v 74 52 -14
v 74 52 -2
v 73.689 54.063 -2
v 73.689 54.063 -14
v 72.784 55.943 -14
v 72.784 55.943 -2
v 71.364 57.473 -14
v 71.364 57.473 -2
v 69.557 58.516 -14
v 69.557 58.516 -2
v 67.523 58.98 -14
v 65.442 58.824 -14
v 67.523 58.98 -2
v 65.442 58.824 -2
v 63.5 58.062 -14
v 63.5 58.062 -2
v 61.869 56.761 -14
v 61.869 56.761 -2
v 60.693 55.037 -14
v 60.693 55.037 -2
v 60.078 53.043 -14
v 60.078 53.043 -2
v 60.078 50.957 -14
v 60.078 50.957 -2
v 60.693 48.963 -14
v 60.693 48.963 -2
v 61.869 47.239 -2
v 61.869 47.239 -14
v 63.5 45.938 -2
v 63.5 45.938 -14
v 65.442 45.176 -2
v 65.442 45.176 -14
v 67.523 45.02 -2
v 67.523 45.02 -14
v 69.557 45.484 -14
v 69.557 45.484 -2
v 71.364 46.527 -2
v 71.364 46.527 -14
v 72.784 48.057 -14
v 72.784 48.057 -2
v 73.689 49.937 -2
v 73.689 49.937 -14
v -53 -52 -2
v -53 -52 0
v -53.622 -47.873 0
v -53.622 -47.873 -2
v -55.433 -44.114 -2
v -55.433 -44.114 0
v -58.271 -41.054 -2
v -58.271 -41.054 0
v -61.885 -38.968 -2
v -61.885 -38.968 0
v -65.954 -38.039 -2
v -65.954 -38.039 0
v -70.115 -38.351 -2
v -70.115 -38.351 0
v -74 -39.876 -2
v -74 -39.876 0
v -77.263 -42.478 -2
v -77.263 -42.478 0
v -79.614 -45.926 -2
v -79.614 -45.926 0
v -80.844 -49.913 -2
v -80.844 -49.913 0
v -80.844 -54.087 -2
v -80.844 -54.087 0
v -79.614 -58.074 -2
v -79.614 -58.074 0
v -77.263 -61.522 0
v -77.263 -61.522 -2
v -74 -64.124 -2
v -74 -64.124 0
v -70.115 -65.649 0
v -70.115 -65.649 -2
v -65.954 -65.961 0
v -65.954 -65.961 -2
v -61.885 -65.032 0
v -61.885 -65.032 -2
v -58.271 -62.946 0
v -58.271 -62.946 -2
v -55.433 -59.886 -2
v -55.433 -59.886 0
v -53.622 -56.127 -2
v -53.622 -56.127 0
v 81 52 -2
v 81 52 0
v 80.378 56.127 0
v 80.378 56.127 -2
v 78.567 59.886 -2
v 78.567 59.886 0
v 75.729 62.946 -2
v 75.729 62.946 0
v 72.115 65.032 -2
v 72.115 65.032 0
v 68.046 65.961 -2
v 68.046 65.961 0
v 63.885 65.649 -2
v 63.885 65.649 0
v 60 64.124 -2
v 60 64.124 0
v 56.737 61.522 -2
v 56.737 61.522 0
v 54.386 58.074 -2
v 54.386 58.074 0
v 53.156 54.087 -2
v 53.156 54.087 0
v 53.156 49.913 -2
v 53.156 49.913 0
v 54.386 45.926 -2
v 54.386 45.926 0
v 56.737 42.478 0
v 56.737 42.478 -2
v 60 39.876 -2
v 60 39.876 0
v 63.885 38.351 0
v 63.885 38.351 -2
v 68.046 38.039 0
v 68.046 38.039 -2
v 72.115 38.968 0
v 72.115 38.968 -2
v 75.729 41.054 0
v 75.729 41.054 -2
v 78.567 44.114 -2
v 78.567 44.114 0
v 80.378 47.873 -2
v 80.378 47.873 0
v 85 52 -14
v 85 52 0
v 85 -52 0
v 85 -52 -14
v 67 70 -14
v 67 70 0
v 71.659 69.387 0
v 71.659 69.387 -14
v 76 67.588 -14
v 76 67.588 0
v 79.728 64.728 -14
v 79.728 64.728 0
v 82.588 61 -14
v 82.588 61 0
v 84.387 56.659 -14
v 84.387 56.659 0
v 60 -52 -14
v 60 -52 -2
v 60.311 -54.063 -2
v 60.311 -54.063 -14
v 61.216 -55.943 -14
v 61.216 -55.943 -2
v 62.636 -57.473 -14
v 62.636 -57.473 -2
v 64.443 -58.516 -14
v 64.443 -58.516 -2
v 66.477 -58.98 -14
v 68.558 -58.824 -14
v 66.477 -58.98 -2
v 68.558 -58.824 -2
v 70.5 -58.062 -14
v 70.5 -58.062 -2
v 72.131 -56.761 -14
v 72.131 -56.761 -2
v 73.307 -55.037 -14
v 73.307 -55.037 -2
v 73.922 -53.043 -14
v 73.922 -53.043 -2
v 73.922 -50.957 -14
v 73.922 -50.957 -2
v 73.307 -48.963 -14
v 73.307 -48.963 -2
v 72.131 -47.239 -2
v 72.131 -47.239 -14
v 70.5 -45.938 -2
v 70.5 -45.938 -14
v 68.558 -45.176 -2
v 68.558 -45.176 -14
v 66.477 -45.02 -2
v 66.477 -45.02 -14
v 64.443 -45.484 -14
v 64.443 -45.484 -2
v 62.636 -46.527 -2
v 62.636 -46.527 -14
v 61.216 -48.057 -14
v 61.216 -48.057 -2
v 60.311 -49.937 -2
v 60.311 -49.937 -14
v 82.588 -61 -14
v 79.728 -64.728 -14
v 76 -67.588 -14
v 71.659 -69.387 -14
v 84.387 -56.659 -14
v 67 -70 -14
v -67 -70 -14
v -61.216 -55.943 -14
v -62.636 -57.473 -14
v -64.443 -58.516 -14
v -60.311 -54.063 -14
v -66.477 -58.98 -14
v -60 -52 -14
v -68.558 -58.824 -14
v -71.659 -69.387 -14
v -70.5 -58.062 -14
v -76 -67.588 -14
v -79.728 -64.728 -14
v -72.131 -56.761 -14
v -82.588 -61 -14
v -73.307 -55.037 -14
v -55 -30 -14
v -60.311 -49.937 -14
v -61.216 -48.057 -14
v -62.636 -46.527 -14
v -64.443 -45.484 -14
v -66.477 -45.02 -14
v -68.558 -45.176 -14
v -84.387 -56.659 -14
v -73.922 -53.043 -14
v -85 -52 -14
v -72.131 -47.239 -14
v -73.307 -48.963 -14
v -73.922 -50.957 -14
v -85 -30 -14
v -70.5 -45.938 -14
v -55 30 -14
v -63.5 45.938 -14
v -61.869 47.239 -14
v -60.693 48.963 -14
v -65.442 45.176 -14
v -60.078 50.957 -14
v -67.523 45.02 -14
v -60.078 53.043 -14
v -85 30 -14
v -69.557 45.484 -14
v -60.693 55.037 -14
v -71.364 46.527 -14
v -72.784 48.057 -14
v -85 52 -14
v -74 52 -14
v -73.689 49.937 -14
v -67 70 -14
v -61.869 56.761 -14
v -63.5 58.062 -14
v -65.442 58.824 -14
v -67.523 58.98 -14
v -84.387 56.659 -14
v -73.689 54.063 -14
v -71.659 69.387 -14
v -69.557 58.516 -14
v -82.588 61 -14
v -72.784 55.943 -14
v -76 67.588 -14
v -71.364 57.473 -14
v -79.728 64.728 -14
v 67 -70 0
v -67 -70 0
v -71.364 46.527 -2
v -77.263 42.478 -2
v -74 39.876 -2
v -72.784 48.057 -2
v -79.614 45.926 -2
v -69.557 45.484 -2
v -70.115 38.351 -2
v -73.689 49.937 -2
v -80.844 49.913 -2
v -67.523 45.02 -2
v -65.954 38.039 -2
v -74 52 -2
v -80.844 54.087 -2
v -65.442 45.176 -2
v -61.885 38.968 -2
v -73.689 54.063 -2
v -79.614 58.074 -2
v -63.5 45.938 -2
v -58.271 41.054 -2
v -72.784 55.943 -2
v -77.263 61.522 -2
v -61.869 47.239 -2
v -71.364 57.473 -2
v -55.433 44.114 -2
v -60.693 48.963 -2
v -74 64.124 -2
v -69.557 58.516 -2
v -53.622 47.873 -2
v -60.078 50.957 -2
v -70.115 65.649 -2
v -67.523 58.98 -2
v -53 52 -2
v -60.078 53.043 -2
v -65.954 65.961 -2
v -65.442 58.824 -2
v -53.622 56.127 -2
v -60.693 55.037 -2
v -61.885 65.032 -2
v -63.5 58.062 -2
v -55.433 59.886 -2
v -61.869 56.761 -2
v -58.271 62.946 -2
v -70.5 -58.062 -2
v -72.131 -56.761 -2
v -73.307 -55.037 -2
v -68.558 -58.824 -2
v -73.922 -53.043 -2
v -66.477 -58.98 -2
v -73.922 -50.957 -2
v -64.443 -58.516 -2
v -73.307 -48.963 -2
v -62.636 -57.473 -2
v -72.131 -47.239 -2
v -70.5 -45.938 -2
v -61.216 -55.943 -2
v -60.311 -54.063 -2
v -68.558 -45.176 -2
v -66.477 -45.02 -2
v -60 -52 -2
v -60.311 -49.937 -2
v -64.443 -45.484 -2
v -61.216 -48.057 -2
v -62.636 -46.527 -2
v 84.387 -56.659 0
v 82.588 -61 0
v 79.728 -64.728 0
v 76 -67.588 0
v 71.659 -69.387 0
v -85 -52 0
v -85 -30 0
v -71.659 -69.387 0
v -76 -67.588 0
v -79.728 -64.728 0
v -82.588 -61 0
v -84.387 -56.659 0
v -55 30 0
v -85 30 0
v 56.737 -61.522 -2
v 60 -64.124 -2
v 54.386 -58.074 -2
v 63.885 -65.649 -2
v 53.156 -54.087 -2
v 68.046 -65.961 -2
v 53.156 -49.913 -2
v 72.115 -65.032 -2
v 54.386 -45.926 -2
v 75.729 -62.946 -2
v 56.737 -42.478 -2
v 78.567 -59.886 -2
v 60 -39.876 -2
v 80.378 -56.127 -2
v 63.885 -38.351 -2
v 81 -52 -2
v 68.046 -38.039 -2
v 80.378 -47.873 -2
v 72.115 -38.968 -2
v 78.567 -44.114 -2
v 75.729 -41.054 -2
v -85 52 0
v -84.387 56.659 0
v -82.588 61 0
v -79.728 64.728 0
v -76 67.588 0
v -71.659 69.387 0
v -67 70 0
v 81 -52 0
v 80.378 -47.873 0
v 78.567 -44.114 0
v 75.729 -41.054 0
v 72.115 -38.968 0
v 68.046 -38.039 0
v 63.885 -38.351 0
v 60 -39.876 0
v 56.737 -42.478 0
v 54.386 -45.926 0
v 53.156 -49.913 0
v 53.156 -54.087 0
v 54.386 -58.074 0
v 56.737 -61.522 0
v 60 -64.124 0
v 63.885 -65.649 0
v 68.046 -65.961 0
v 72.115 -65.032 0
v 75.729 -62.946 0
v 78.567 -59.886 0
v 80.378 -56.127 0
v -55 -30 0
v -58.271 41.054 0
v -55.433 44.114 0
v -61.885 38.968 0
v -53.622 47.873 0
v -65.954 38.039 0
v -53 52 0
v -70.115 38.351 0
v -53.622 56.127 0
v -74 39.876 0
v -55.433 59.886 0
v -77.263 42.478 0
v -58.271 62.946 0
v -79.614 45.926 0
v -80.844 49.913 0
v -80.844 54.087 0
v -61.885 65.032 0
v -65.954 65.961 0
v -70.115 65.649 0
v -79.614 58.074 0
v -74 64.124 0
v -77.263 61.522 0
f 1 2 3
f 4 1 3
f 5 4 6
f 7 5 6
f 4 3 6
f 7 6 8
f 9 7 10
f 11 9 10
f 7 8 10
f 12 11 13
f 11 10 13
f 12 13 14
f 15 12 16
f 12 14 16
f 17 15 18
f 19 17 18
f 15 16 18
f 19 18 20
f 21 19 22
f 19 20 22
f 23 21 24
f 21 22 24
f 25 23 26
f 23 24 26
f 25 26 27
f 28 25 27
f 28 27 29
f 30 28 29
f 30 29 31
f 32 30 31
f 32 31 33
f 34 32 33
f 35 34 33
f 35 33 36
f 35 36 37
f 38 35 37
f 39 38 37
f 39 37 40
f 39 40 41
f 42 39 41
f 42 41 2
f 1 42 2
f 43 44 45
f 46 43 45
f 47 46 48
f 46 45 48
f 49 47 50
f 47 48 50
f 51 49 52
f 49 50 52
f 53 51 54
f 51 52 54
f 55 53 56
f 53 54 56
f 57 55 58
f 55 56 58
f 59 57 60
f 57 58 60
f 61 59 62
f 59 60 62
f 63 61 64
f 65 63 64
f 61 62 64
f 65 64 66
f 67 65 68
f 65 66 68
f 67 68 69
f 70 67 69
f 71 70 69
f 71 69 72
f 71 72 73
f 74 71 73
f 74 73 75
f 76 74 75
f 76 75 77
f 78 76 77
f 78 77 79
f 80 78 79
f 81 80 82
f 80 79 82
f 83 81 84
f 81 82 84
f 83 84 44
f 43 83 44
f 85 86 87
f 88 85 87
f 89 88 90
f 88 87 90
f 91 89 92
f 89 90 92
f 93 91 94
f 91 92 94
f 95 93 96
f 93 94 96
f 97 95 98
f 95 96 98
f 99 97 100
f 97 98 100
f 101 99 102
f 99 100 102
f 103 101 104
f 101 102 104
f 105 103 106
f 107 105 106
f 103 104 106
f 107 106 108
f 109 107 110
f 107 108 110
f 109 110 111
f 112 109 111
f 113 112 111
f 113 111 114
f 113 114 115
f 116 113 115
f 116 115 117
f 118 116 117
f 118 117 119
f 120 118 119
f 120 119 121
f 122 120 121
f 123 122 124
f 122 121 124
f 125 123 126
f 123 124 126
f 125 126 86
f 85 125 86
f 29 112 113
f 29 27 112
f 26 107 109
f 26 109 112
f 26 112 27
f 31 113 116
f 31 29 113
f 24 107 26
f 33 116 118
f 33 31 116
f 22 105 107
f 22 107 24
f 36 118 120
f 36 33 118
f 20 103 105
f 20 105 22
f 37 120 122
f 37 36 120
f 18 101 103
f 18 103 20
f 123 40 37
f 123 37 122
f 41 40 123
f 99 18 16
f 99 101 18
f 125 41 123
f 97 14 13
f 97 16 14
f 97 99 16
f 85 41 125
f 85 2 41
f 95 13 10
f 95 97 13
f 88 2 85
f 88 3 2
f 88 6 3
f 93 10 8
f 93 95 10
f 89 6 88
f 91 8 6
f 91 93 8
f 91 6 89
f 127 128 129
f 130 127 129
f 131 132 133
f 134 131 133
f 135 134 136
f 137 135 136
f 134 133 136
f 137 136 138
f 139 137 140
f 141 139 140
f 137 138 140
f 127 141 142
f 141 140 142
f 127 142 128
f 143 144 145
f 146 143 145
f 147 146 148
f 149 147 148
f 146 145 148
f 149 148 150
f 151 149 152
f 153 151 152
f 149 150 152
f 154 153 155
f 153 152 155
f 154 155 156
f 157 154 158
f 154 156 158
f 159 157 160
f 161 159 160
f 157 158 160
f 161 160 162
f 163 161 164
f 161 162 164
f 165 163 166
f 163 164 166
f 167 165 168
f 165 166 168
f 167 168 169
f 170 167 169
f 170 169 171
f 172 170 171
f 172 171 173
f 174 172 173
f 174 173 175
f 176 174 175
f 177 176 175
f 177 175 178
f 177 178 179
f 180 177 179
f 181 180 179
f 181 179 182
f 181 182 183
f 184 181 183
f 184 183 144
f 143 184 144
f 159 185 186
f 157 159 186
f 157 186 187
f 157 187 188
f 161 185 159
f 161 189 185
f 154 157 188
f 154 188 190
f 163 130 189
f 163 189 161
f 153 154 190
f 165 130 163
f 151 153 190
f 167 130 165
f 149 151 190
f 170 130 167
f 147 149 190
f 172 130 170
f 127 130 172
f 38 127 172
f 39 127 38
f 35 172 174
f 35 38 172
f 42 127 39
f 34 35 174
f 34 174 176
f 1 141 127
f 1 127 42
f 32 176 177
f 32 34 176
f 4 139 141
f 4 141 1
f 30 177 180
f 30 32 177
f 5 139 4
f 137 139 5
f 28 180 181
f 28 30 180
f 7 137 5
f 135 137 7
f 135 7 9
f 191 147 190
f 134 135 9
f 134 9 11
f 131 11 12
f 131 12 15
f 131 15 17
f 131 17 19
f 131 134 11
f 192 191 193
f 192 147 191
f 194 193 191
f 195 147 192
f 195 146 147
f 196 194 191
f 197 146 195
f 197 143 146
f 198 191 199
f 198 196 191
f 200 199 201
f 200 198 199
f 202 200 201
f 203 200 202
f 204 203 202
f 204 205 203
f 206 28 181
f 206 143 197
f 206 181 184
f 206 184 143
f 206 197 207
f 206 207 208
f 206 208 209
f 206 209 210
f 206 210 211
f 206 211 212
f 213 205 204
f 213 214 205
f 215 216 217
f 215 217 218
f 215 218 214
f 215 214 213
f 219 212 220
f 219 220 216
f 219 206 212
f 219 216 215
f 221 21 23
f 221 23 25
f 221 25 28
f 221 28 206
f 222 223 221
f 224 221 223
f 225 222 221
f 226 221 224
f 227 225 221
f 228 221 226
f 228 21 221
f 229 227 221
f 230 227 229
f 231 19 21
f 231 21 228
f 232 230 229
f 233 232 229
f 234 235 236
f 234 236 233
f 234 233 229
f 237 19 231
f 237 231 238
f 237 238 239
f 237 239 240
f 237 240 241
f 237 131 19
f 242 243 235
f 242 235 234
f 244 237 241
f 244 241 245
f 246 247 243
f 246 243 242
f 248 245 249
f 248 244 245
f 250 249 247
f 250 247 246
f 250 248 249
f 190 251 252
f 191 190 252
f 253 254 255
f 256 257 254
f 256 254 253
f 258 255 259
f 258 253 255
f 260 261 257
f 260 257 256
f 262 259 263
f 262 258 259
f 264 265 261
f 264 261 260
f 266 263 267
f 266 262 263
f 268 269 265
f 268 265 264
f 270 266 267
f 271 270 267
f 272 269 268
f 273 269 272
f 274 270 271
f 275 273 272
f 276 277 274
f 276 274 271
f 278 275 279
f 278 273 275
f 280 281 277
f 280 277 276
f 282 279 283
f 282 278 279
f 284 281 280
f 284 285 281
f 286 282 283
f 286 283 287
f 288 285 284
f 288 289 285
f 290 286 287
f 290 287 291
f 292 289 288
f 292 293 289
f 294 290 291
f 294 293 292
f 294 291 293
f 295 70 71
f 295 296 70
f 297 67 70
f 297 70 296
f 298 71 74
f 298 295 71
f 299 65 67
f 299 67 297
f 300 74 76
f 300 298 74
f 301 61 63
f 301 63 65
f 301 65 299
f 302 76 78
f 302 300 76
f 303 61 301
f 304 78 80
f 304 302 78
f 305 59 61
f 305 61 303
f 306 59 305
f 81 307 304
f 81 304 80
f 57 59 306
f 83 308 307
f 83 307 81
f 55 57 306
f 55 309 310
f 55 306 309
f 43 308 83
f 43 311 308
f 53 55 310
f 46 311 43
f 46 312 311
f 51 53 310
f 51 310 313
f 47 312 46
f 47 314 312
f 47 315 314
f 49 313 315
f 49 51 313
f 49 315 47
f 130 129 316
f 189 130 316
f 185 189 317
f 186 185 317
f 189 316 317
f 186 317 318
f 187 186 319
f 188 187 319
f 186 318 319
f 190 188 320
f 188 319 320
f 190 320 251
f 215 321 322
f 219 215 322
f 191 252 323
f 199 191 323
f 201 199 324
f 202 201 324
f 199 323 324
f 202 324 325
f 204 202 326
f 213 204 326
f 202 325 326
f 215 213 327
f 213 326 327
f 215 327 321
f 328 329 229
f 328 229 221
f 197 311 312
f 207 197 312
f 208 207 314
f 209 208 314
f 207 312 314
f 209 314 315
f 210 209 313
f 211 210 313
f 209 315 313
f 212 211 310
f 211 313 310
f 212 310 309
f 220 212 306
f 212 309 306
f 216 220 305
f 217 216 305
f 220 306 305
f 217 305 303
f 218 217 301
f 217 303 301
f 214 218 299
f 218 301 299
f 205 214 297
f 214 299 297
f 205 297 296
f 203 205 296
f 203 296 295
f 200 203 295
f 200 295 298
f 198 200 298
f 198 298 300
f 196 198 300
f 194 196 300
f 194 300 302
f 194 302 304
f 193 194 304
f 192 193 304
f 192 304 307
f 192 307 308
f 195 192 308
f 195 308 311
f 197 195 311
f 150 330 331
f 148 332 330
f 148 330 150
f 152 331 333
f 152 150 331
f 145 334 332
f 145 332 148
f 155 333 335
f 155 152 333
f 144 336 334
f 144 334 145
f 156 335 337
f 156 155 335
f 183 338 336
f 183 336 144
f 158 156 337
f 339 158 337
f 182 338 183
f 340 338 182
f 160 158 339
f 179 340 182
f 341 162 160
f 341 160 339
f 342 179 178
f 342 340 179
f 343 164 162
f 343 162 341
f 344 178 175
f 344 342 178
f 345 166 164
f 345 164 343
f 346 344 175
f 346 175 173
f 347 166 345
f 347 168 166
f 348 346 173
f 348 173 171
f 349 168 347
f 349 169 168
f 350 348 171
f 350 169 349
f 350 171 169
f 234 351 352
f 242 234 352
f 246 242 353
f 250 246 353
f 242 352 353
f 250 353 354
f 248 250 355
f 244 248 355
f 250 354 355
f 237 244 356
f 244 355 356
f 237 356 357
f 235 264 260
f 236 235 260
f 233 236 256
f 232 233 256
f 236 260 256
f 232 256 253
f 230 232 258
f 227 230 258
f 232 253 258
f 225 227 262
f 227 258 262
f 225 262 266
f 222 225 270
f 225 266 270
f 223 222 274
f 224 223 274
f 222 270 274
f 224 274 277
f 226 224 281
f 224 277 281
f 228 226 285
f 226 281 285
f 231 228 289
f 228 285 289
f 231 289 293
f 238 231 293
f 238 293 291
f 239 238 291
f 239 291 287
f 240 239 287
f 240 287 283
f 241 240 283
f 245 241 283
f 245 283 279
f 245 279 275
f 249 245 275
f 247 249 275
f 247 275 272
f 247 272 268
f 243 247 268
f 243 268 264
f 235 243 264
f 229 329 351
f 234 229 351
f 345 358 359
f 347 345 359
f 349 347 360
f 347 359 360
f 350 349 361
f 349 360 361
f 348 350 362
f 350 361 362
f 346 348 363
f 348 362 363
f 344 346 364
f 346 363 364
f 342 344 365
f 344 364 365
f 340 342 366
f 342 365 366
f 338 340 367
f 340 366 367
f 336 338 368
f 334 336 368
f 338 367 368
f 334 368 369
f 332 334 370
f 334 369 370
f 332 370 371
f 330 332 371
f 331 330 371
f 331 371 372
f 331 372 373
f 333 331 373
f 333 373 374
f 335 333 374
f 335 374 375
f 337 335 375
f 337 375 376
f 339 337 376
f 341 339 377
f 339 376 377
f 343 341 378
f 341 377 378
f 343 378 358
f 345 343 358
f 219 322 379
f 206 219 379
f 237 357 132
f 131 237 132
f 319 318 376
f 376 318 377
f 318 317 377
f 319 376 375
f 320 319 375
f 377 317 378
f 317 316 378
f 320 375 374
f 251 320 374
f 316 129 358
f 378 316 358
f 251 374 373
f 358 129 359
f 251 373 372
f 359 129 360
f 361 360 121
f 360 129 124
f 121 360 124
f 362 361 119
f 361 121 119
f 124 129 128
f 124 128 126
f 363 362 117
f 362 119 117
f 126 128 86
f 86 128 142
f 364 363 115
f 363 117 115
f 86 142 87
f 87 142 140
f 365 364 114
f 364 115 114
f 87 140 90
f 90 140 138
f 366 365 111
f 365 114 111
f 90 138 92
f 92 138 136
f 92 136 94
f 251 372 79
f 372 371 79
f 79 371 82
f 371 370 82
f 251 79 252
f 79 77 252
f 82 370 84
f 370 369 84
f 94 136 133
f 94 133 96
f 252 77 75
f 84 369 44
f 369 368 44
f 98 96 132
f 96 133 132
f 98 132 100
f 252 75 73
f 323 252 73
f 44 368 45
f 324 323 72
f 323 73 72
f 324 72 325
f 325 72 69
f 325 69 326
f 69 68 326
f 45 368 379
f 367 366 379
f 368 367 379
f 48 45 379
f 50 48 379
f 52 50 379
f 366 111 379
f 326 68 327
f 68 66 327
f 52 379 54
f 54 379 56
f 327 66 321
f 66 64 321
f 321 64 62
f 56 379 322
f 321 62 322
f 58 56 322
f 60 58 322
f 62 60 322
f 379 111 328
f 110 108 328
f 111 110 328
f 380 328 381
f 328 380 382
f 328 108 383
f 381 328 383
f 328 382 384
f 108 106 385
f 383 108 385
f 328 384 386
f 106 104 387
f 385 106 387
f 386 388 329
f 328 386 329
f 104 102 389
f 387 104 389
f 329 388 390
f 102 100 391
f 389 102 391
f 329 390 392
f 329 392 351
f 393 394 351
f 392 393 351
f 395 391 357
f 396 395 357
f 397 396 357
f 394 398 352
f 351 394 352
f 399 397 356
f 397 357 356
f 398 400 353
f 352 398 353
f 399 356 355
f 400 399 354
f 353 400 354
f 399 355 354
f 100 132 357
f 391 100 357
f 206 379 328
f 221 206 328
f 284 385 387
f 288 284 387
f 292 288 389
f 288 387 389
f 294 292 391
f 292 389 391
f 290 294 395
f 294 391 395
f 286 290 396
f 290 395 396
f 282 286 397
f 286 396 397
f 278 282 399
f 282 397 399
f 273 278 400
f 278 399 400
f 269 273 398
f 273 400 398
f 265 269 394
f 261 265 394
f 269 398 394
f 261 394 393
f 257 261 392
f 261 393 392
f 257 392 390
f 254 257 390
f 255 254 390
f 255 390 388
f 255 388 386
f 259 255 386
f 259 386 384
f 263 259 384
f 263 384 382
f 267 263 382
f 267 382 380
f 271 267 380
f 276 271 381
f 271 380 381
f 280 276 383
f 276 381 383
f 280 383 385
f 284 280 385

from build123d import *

# Parameters (mm, degrees)
BOSS_EXTRUDE1_DEPTH = 14
SKETCH10_R          = 7
CUT_EXTRUDE1_DEPTH  = 14
SKETCH11_R          = 14
CUT_EXTRUDE3_DEPTH  = 2
SKETCH12_W          = 30
SKETCH12_H          = 60
CUT_EXTRUDE4_DEPTH  = 14


with BuildPart() as part:
    # Sketch9 → Boss-Extrude1 (new body)
    with BuildSketch(Plane.XY):
        with BuildLine():
            Line((-67, 70), (67, 70))
            ThreePointArc((67, 70), (79.727922061, 64.727922061), (85, 52))
            Line((85, 52), (85, -52))
            ThreePointArc((85, -52), (79.727922061, -64.727922061), (67, -70))
            Line((67, -70), (-67, -70))
            ThreePointArc((-67, -70), (-79.727922061, -64.727922061), (-85, -52))
            Line((-85, -52), (-85, 52))
            ThreePointArc((-85, 52), (-79.727922061, 64.727922061), (-67, 70))
        make_face()
    extrude(amount=-BOSS_EXTRUDE1_DEPTH)

    # Sketch10 → Cut-Extrude1 (cut)
    with BuildSketch(Plane.XY):
        with Locations((67, 52)):
            Circle(SKETCH10_R)
        with Locations(Location((-67, 52, 0), (0, 0, 180))):
            Circle(SKETCH10_R)
        with Locations(Location((67, -52, 0), (0, 0, 180))):
            Circle(SKETCH10_R)
        with Locations((-67, -52)):
            Circle(SKETCH10_R)
    extrude(amount=-CUT_EXTRUDE1_DEPTH, mode=Mode.SUBTRACT)

    # Sketch11 → Cut-Extrude3 (cut)
    with BuildSketch(Plane.XY):
        with Locations((-67, 52)):
            Circle(SKETCH11_R)
        with Locations((67, 52)):
            Circle(SKETCH11_R)
        with Locations((67, -52)):
            Circle(SKETCH11_R)
        with Locations((-67, -52)):
            Circle(SKETCH11_R)
    extrude(amount=-CUT_EXTRUDE3_DEPTH, mode=Mode.SUBTRACT)

    # Sketch12 → Cut-Extrude4 (cut)
    with BuildSketch(Plane.XY):
        with Locations((-70, 0)):
            Rectangle(SKETCH12_W, SKETCH12_H)
    extrude(amount=-CUT_EXTRUDE4_DEPTH, mode=Mode.SUBTRACT)


solid = part.part
